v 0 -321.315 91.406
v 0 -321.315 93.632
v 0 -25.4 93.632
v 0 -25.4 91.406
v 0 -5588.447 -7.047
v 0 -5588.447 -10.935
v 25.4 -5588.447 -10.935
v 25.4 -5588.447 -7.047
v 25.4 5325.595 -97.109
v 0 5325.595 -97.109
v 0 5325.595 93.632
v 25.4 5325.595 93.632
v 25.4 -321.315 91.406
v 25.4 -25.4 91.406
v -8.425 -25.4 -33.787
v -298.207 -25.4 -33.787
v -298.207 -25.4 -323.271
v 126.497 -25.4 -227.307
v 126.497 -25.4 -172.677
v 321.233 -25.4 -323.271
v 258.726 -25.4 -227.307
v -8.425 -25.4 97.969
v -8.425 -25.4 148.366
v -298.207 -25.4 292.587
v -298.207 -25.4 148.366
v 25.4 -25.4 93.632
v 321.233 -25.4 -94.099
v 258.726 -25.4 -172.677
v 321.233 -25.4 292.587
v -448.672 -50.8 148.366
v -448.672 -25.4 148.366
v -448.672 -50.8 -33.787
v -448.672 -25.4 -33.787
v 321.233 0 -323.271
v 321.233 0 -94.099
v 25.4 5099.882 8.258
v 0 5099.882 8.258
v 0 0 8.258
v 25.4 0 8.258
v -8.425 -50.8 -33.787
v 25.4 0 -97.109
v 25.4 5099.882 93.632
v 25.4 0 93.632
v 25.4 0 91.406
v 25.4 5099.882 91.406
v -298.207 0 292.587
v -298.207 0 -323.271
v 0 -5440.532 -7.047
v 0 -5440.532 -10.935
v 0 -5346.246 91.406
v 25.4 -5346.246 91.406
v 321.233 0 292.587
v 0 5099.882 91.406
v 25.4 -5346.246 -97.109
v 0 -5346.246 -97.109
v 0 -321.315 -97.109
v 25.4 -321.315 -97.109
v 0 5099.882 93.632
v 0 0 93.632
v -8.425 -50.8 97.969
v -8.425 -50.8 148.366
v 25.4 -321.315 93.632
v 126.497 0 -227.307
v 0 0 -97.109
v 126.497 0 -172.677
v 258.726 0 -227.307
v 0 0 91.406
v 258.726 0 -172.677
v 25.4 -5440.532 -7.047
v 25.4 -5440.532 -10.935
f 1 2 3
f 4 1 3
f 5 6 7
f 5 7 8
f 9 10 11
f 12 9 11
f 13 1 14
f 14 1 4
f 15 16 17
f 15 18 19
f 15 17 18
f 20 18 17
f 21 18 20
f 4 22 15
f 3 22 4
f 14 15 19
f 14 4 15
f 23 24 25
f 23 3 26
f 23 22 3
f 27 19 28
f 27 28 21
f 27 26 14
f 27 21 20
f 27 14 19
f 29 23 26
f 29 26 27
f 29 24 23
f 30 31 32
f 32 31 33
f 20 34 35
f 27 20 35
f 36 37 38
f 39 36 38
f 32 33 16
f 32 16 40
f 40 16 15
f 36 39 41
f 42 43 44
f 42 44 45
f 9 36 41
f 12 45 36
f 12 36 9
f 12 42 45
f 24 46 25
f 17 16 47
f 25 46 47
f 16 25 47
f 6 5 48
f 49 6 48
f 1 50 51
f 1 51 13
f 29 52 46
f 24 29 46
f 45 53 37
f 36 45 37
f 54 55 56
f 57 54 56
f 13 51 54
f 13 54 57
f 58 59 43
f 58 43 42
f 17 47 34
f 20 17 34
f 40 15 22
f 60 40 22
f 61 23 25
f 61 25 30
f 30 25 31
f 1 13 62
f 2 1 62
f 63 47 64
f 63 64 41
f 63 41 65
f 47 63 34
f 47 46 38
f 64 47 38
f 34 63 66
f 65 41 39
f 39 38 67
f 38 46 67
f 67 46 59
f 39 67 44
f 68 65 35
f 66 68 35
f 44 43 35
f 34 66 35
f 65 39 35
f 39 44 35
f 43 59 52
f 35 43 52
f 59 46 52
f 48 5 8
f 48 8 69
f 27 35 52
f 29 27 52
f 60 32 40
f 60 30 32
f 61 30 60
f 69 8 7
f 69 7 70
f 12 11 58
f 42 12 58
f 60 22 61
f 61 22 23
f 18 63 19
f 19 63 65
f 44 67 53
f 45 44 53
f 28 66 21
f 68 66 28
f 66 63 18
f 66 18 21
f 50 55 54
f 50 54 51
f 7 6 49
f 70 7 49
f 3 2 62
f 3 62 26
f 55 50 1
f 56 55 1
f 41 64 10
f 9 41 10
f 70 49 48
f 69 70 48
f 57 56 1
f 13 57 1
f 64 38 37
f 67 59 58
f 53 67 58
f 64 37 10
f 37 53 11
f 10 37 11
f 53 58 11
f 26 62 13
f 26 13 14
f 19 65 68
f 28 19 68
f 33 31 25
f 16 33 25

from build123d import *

# Parameters (mm, degrees)
F0_W     = 147.914886
F0_H     = 3.887745
F0_W_2   = 5024.930954
F0_H_2   = 188.515387
F0_W_3   = 5421.196938
F0_H_3   = 2.225697
F1_DEPTH = 25.4
F2_W     = 325.817824
F2_H     = 229.171991
F2_W_2   = 293.622017
F2_W_3   = 132.228852
F2_H_2   = 54.629802
F3_DEPTH = 25.4
F5_W     = 220.123529
F5_H     = 50.397665
F5_W_2   = 220.12353
F6_DEPTH = 25.4


with BuildPart() as f1:
    # F0 (on Right) → F1 (new body)
    with BuildSketch(Plane.YZ):
        with Locations((-5514.489174, -8.991063)):
            Rectangle(F0_W, F0_H)
        with Locations((-2833.780289, -2.851534)):
            Rectangle(F0_W_2, F0_H_2)
        with Locations((2389.283657, 92.519008)):
            Rectangle(F0_W_3, F0_H_3)
        Polygon((5099.882126, 93.631856), (5099.882126, 91.406159), (5099.882126, 8.258243), (5325.595379, 8.258243), (5325.595379, 93.631856), align=None)
        Polygon((5325.595379, 8.258243), (5099.882126, 8.258243), (0, 8.258243), (0, -97.109228), (5325.595379, -97.109228), align=None)
    extrude(amount=F1_DEPTH)

    # F2 (on Front) → F3 (join)
    with BuildSketch(Plane.XZ):
        with Locations((-135.298133, -208.68504)):
            Rectangle(F2_W, F2_H)
        with Locations((174.421787, -208.68504)):
            Rectangle(F2_W_2, F2_H)
        with Locations((192.611456, -199.992299)):
            Rectangle(F2_W_3, F2_H_2, mode=Mode.SUBTRACT)
        Polygon((-298.207045, -94.099045), (27.610779, -94.099045), (321.232796, -94.099045), (321.232796, 292.58728), (-298.207045, 292.58728), align=None)
    extrude(amount=F3_DEPTH)

    # F5 (on face) → F6 (join)
    with BuildSketch(Plane.XZ.offset(25.4)):
        Polygon((-8.425236, -33.787251), (-8.425236, 97.968727), (-228.548765, 97.968727), (-448.672295, 97.968727), (-448.672295, -33.787251), align=None)
        with Locations((-118.487001, 123.167559)):
            Rectangle(F5_W, F5_H)
        with Locations((-338.61053, 123.167559)):
            Rectangle(F5_W_2, F5_H)
    extrude(amount=F6_DEPTH)


solid = f1.part
